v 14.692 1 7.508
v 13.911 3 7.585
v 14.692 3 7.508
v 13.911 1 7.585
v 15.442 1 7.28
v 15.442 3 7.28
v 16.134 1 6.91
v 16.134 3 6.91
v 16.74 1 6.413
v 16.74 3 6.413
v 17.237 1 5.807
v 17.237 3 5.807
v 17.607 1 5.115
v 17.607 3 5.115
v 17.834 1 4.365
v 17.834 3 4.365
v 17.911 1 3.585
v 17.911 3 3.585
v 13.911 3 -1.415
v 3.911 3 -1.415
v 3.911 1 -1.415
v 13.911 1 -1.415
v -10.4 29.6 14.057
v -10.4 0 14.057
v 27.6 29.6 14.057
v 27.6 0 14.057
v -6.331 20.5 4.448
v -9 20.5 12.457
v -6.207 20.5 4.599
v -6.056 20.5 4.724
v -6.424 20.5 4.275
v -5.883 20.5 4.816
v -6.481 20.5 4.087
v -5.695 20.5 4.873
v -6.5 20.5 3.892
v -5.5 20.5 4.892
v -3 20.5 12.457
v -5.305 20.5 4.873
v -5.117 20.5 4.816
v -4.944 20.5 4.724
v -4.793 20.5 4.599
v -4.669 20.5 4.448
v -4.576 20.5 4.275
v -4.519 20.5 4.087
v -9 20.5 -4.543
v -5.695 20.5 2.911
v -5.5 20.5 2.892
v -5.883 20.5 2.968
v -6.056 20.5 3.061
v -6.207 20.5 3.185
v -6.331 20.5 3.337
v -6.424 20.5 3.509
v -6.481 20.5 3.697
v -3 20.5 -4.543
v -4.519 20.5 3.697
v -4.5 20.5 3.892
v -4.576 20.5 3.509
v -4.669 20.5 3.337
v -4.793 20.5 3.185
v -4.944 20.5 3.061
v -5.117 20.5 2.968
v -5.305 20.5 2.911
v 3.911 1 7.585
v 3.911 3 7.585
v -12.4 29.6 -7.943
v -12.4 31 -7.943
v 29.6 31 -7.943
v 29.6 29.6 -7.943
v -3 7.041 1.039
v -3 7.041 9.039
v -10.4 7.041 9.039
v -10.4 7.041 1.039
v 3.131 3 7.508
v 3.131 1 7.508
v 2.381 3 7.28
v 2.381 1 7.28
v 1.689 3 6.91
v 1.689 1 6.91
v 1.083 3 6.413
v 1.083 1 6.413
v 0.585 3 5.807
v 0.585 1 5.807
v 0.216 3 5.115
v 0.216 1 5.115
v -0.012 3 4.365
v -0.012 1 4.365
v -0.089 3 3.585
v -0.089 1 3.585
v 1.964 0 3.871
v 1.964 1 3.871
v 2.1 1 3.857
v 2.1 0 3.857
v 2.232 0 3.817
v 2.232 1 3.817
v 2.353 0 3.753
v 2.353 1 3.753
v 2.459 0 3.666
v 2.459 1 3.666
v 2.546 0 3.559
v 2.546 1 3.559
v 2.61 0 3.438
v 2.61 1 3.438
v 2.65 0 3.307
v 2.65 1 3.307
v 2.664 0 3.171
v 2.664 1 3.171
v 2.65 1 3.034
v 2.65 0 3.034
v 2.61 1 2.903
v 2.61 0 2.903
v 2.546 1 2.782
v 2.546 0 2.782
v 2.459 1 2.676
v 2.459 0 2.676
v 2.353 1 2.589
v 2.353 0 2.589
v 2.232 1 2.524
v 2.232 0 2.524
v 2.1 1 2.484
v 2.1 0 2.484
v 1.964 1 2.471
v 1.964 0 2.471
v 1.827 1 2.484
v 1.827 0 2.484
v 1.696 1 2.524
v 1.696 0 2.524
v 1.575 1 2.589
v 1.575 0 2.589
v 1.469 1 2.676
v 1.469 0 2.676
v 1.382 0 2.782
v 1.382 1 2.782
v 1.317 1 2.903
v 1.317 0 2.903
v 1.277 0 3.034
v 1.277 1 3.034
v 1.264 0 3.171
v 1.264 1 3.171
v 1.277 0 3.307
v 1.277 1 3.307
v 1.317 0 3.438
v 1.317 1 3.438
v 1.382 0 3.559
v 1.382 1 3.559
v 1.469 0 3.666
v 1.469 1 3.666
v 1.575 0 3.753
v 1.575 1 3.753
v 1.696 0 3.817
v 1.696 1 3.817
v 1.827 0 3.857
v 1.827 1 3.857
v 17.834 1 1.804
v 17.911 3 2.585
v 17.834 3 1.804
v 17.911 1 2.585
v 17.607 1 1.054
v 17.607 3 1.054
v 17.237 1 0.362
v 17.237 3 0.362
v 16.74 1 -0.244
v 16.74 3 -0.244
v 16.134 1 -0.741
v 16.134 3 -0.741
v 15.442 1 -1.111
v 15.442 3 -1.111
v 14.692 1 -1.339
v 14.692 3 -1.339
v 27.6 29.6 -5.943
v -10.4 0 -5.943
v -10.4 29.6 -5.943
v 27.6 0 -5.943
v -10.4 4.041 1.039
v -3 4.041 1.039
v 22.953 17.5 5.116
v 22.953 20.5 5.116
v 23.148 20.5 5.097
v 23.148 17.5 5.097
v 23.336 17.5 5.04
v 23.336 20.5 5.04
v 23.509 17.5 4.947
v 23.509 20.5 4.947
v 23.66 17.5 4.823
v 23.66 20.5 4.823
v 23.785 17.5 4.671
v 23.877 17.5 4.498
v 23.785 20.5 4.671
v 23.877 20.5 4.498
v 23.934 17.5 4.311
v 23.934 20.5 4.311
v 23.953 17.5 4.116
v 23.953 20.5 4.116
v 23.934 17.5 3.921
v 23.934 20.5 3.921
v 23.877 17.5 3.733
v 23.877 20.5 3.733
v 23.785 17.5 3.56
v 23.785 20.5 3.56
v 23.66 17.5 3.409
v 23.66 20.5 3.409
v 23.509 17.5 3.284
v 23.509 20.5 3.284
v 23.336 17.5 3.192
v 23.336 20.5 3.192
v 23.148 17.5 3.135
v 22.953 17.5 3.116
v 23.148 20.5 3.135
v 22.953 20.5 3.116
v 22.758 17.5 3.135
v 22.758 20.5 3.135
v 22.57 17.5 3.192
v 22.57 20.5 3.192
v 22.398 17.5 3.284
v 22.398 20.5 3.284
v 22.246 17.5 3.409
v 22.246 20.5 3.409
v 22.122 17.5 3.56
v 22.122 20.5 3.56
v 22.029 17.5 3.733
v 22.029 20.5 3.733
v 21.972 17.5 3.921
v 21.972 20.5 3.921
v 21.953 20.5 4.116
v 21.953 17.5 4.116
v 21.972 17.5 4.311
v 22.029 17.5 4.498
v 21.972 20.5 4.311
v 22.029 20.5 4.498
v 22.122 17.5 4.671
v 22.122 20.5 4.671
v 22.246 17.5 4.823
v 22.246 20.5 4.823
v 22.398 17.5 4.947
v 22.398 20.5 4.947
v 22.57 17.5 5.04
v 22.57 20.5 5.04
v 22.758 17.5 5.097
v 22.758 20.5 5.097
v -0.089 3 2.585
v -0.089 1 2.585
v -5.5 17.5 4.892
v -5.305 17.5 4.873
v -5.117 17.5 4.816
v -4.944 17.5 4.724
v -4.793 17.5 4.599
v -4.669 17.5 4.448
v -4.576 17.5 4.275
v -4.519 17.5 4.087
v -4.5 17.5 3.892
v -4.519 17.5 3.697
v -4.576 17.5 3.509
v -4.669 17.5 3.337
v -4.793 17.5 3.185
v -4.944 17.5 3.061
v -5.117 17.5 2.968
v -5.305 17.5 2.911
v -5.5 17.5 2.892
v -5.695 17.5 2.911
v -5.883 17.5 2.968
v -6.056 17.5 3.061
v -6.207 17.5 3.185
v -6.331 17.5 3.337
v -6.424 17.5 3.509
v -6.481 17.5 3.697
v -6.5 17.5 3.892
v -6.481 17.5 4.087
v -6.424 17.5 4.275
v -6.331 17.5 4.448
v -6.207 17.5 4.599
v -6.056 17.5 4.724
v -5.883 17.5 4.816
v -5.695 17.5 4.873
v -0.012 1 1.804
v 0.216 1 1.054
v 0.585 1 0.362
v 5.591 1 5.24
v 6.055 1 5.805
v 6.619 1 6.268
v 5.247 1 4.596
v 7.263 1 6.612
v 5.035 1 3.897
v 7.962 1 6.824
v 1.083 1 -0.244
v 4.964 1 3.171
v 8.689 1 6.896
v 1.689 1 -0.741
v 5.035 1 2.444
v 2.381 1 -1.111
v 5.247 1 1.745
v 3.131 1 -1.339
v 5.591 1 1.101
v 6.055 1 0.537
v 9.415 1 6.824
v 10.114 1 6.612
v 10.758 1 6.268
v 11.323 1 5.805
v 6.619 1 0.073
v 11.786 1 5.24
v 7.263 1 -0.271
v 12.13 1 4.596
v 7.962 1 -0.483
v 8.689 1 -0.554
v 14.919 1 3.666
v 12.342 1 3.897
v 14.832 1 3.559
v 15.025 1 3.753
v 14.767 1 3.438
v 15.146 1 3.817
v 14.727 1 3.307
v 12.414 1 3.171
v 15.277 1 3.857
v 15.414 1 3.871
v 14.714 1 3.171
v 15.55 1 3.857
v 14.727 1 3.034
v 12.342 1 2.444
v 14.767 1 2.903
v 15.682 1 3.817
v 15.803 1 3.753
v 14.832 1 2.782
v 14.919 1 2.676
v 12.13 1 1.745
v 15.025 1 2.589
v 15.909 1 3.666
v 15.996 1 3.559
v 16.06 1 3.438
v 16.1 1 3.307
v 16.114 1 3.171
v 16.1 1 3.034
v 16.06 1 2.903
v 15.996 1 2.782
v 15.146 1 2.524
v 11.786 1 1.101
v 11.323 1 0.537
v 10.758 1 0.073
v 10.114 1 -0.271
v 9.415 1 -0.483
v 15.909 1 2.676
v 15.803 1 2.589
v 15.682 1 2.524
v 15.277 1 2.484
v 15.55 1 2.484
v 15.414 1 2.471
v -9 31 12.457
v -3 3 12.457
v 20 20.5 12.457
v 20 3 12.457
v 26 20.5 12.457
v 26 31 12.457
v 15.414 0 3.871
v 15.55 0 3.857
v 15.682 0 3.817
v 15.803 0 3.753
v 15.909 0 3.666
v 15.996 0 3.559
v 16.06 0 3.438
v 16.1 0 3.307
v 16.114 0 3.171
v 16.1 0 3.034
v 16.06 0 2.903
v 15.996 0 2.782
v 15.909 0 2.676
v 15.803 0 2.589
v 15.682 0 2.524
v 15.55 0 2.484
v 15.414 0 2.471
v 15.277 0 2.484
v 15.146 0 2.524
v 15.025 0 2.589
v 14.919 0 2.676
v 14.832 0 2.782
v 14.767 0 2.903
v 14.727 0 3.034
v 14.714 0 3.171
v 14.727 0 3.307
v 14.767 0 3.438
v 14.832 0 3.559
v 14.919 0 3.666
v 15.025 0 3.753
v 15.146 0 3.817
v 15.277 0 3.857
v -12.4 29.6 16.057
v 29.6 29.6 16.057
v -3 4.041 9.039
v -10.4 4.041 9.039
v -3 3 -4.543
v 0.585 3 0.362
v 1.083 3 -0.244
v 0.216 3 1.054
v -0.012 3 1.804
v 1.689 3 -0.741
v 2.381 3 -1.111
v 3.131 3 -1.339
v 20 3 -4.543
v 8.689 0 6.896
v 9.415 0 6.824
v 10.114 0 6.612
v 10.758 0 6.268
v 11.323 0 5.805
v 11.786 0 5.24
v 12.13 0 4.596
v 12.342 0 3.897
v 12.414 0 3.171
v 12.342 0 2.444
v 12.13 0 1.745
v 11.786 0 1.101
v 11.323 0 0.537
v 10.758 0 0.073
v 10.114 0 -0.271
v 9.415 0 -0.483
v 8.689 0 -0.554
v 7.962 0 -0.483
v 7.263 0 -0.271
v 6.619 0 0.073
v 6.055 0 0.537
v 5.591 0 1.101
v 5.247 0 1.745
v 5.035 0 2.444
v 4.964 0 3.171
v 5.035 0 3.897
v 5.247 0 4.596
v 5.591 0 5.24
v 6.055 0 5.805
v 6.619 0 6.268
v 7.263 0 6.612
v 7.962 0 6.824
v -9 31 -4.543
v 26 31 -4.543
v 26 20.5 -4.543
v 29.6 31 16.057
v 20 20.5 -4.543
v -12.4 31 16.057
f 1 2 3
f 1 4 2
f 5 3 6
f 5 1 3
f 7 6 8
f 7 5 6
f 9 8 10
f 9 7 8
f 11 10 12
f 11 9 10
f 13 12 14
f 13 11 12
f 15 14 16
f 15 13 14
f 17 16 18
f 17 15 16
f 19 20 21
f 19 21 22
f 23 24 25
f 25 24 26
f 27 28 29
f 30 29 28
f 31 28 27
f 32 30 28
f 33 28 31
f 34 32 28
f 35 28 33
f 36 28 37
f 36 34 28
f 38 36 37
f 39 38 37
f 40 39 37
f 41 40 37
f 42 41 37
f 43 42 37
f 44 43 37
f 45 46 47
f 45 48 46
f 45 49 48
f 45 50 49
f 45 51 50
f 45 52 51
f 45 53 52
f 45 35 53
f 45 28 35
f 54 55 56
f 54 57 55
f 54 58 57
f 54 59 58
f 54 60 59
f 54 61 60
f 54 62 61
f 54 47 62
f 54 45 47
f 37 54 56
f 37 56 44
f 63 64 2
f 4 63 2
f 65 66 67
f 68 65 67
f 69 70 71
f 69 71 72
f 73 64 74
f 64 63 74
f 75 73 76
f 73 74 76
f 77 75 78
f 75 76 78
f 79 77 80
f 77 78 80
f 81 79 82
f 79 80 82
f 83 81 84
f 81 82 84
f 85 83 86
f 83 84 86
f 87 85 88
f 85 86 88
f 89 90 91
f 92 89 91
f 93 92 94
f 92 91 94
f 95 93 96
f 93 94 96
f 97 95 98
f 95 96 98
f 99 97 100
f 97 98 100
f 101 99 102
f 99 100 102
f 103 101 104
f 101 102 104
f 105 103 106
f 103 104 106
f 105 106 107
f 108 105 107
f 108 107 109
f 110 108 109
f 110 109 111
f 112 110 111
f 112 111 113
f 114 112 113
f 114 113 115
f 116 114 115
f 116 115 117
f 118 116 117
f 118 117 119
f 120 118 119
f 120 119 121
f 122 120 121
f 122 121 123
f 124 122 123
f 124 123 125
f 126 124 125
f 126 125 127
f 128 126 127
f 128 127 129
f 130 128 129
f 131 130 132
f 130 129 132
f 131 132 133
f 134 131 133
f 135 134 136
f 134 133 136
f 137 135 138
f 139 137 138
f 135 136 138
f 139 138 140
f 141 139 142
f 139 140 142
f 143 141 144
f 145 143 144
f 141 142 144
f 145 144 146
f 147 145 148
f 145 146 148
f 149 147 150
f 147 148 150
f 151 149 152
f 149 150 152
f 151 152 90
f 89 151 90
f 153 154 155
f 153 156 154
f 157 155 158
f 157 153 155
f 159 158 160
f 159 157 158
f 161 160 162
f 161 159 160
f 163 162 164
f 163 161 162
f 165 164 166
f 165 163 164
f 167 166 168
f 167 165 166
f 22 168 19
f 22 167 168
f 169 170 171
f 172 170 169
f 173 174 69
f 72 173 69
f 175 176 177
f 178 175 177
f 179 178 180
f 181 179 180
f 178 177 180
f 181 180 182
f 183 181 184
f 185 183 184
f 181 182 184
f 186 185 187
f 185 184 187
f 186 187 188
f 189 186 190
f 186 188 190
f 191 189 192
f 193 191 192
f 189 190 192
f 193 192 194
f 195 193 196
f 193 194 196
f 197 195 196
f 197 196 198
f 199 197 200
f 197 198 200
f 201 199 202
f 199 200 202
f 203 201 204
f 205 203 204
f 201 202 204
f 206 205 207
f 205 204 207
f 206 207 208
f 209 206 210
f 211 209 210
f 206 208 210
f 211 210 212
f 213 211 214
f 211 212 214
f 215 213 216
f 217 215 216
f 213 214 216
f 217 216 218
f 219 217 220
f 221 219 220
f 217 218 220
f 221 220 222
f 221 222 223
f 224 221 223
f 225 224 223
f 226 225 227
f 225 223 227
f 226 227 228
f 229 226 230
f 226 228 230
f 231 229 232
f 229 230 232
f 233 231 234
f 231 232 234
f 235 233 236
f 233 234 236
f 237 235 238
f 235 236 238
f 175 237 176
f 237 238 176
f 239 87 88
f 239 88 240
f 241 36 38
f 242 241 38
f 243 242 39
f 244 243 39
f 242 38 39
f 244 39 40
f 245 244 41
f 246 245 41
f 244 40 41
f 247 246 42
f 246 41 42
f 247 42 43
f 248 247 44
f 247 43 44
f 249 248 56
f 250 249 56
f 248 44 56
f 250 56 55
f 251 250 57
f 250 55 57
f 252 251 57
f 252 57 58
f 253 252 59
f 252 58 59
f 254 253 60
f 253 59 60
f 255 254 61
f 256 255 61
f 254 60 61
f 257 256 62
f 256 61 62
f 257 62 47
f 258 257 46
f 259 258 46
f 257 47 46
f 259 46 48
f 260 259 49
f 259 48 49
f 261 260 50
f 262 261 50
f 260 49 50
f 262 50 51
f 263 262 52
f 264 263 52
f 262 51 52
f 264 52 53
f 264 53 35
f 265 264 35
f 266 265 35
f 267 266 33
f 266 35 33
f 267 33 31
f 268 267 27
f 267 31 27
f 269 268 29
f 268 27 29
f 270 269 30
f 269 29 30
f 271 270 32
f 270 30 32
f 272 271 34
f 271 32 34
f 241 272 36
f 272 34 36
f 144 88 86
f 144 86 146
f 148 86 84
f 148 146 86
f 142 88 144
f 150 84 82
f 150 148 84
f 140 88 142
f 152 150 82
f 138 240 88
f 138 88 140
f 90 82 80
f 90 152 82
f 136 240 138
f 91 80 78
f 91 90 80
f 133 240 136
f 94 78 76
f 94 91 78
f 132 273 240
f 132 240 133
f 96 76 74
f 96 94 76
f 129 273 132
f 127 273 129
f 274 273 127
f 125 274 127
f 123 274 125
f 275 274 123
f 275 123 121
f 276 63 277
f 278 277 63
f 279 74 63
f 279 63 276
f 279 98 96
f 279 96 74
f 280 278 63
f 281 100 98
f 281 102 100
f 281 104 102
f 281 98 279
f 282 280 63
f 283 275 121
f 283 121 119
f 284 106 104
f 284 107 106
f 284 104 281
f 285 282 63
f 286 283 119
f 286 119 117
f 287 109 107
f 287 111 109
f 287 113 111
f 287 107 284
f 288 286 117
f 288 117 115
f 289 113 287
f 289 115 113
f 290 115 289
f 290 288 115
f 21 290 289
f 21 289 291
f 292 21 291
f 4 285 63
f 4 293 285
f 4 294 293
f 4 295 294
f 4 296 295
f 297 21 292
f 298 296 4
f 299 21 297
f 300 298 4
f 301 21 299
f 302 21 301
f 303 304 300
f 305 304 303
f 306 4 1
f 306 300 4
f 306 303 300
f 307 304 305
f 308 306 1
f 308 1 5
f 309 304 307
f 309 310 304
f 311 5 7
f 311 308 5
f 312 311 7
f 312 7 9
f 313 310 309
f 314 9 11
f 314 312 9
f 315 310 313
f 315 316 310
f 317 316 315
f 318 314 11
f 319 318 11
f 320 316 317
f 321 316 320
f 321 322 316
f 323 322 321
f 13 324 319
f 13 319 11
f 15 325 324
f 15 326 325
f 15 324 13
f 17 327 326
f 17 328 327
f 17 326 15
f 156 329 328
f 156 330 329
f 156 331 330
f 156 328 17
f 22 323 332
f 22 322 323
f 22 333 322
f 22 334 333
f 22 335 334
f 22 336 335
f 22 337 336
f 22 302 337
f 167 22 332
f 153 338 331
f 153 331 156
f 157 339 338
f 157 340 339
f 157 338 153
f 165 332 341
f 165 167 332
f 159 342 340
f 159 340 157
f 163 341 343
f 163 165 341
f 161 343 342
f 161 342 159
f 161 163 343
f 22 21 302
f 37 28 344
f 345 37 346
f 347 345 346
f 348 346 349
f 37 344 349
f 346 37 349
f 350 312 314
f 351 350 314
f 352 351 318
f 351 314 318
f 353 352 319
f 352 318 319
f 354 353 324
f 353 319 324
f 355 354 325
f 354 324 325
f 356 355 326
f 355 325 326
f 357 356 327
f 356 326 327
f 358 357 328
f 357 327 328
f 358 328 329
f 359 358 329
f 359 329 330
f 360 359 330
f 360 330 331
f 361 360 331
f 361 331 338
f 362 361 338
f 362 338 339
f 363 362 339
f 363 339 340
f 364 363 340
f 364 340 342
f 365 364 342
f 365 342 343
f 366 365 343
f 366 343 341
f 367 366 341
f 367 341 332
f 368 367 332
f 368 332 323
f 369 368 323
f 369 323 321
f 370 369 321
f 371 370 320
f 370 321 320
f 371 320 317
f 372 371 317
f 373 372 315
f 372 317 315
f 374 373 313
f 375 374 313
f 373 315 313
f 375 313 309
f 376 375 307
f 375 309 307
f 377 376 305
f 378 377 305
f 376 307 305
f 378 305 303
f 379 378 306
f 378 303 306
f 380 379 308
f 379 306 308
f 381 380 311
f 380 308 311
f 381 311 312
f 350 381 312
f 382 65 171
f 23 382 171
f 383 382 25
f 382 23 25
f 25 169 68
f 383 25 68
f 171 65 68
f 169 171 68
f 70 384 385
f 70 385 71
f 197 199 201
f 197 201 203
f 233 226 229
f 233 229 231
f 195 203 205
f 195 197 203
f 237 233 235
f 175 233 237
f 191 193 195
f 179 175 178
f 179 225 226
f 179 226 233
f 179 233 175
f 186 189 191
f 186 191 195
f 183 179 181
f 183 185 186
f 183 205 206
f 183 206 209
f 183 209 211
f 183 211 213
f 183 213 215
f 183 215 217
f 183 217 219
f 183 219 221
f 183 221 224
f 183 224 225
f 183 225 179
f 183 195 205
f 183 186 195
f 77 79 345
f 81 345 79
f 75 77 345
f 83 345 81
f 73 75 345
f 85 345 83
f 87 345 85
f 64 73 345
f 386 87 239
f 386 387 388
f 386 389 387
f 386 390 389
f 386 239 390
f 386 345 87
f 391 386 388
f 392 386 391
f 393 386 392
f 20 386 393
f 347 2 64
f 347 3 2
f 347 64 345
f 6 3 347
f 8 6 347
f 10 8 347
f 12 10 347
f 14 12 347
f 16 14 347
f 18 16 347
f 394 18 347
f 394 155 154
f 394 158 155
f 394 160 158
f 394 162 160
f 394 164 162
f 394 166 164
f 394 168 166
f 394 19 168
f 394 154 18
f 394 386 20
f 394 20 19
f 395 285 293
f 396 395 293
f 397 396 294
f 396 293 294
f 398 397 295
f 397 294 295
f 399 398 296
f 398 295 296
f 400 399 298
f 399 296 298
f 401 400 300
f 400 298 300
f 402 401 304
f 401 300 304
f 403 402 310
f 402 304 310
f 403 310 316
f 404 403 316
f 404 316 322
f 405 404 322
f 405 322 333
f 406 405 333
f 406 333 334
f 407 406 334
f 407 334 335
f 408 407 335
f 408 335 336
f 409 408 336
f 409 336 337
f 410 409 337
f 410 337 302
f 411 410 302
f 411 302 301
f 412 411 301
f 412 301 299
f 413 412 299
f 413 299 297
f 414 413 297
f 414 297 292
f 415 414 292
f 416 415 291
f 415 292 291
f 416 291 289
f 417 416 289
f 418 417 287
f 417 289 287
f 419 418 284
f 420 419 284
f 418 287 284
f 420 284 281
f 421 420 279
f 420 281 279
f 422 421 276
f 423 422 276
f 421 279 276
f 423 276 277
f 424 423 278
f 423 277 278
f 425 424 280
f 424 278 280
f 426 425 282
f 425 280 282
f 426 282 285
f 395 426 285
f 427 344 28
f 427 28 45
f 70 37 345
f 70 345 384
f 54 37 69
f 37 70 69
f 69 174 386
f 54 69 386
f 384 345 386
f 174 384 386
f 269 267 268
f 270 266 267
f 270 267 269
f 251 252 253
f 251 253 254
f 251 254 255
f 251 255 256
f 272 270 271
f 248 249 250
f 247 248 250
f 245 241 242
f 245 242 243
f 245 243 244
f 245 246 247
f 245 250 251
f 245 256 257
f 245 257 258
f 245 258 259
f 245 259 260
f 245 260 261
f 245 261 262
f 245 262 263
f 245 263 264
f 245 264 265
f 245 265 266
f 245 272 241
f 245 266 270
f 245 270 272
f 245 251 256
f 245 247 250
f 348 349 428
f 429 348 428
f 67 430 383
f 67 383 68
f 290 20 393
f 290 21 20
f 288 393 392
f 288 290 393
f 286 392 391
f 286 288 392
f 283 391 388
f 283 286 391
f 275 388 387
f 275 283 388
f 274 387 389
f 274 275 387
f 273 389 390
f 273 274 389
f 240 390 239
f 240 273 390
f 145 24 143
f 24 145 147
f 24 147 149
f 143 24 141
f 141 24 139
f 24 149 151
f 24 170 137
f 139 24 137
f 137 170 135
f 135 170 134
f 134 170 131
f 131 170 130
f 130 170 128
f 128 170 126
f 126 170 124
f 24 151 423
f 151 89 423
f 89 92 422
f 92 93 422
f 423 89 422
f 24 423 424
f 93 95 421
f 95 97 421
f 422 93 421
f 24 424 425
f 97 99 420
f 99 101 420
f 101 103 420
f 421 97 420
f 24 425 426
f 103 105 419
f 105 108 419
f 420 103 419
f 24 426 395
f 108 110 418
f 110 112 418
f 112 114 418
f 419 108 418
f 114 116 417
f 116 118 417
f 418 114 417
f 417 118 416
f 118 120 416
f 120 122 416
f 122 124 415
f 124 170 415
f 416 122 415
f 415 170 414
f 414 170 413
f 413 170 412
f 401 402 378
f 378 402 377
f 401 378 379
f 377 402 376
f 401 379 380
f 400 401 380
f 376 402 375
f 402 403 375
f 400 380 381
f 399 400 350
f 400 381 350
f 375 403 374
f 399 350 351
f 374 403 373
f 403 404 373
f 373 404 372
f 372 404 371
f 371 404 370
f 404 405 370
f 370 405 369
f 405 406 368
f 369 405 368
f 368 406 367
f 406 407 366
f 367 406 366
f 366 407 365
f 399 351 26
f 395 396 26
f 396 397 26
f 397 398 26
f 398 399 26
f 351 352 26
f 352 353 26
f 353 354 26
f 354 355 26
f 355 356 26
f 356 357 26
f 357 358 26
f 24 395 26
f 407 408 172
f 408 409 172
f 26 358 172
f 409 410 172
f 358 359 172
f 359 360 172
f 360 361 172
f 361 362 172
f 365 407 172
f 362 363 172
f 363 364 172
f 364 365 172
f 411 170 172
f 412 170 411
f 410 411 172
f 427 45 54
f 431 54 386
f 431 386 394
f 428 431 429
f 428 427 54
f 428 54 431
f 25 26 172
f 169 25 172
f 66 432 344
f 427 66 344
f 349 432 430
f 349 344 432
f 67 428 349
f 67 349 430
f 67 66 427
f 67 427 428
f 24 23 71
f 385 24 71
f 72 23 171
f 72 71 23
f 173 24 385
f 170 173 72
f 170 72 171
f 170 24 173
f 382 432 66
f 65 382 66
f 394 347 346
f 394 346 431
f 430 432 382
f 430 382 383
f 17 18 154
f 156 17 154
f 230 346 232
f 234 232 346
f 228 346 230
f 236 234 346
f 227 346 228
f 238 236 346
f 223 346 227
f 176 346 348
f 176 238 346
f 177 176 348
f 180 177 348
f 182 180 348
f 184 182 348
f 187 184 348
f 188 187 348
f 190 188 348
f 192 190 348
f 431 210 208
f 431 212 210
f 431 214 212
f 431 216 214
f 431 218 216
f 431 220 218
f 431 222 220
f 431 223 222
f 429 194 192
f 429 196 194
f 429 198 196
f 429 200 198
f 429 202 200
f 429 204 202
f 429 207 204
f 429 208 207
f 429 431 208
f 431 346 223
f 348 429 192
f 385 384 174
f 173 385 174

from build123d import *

# Parameters (mm, degrees)
SKETCH1_W           = 38
SKETCH1_H           = 20
BOSS_EXTRUDE1_DEPTH = 31
SKETCH2_W           = 35
SKETCH2_H           = 17
CUT_EXTRUDE1_DEPTH  = 28
SKETCH3_W           = 6
SKETCH3_H           = 17
BOSS_EXTRUDE2_DEPTH = 17.5
SKETCH4_W           = 42
SKETCH4_H           = 24
SKETCH4_W_2         = 38
SKETCH4_H_2         = 20
EXTRUDE_THIN2_DEPTH = 1.4
SKETCH5_R           = 1
CUT_EXTRUDE2_DEPTH  = 3
SKETCH6_R           = 1
CUT_EXTRUDE3_DEPTH  = 3
SKETCH7_W           = 8
SKETCH7_H           = 3
CUT_EXTRUDE4_DEPTH  = 10
SKETCH8_W           = 18
SKETCH8_H           = 9
CUT_EXTRUDE5_DEPTH  = 2
SKETCH9_R           = 3.725
SKETCH9_R_2         = 0.7
CUT_EXTRUDE6_DEPTH  = 4
FILLET1_R           = 4


with BuildPart() as part:
    # Sketch1 → Boss-Extrude1 (new body)
    with BuildSketch(Plane(origin=(0, 0, 0), x_dir=(1, 0, 0), z_dir=(0, 1, 0))):
        with Locations((8.6, -4.057142857)):
            Rectangle(SKETCH1_W, SKETCH1_H)
    extrude(amount=BOSS_EXTRUDE1_DEPTH)

    # Sketch2 → Cut-Extrude1 (cut)
    with BuildSketch(Plane(origin=(0, 31, 0), x_dir=(1, 0, 0), z_dir=(0, 1, 0))):
        with Locations((8.5, -3.957142857)):
            Rectangle(SKETCH2_W, SKETCH2_H)
    extrude(amount=-CUT_EXTRUDE1_DEPTH, mode=Mode.SUBTRACT)

    # Sketch3 → Boss-Extrude2 (add)
    with BuildSketch(Plane(origin=(0, 3, 0), x_dir=(1, 0, 0), z_dir=(0, 1, 0))):
        with Locations((-6, -3.957142857)):
            Rectangle(SKETCH3_W, SKETCH3_H)
        with Locations((23, -3.957142857)):
            Rectangle(SKETCH3_W, SKETCH3_H)
    extrude(amount=BOSS_EXTRUDE2_DEPTH)

    # Sketch4 → Extrude-Thin2 (add)
    with BuildSketch(Plane(origin=(0, 31, 0), x_dir=(1, 0, 0), z_dir=(0, 1, 0))):
        with Locations((8.6, -4.057142857)):
            Rectangle(SKETCH4_W, SKETCH4_H)
        with Locations((8.6, -4.057142857)):
            Rectangle(SKETCH4_W_2, SKETCH4_H_2, mode=Mode.SUBTRACT)
    extrude(amount=-EXTRUDE_THIN2_DEPTH)

    # Sketch5 → Cut-Extrude2 (cut)
    with BuildSketch(Plane(origin=(0, 20.5, 0), x_dir=(1, 0, 0), z_dir=(0, 1, 0))):
        with Locations(Location((-5.5, -3.892148731, 0), (0, 0, 270))):
            Circle(SKETCH5_R)
    extrude(amount=-CUT_EXTRUDE2_DEPTH, mode=Mode.SUBTRACT)

    # Sketch6 → Cut-Extrude3 (cut)
    with BuildSketch(Plane(origin=(0, 20.5, 0), x_dir=(1, 0, 0), z_dir=(0, 1, 0))):
        with Locations(Location((22.953148274, -4.115727136, 0), (0, 0, 270))):
            Circle(SKETCH6_R)
    extrude(amount=-CUT_EXTRUDE3_DEPTH, mode=Mode.SUBTRACT)

    # Sketch7 → Cut-Extrude4 (cut)
    with BuildSketch(Plane(origin=(-3, 0, 0), x_dir=(0, 0, -1), z_dir=(1, 0, 0))):
        with Locations((-5.039117413, 5.541369126)):
            Rectangle(SKETCH7_W, SKETCH7_H)
    extrude(amount=-CUT_EXTRUDE4_DEPTH, mode=Mode.SUBTRACT)

    # Sketch8 → Cut-Extrude5 (cut)
    with BuildSketch(Plane(origin=(0, 3, 0), x_dir=(1, 0, 0), z_dir=(0, 1, 0))):
        with Locations((8.91134377, -3.084544202)):
            Rectangle(SKETCH8_W, SKETCH8_H)
    extrude(amount=-CUT_EXTRUDE5_DEPTH, mode=Mode.SUBTRACT)

    # Sketch9 → Cut-Extrude6 (cut)
    with BuildSketch(Plane(origin=(0, 1, 0), x_dir=(1, 0, 0), z_dir=(0, 1, 0))):
        with Locations(Location((8.68865623, -3.170580553, 0), (0, 0, 270))):
            Circle(SKETCH9_R)
        with Locations(Location((1.96365623, -3.170580553, 0), (0, 0, 270))):
            Circle(SKETCH9_R_2)
        with Locations(Location((15.41365623, -3.170580553, 0), (0, 0, 270))):
            Circle(SKETCH9_R_2)
    extrude(amount=-CUT_EXTRUDE6_DEPTH, mode=Mode.SUBTRACT)

    # Fillet1
    fillet1_edges = [part.edges().sort_by_distance(p)[0] for p in [
        (-0.08865623, 2, 7.584544202),
        (-0.08865623, 2, -1.415455798),
        (17.91134377, 2, -1.415455798),
        (17.91134377, 2, 7.584544202),
    ]]
    fillet(fillet1_edges, radius=FILLET1_R)


solid = part.part
